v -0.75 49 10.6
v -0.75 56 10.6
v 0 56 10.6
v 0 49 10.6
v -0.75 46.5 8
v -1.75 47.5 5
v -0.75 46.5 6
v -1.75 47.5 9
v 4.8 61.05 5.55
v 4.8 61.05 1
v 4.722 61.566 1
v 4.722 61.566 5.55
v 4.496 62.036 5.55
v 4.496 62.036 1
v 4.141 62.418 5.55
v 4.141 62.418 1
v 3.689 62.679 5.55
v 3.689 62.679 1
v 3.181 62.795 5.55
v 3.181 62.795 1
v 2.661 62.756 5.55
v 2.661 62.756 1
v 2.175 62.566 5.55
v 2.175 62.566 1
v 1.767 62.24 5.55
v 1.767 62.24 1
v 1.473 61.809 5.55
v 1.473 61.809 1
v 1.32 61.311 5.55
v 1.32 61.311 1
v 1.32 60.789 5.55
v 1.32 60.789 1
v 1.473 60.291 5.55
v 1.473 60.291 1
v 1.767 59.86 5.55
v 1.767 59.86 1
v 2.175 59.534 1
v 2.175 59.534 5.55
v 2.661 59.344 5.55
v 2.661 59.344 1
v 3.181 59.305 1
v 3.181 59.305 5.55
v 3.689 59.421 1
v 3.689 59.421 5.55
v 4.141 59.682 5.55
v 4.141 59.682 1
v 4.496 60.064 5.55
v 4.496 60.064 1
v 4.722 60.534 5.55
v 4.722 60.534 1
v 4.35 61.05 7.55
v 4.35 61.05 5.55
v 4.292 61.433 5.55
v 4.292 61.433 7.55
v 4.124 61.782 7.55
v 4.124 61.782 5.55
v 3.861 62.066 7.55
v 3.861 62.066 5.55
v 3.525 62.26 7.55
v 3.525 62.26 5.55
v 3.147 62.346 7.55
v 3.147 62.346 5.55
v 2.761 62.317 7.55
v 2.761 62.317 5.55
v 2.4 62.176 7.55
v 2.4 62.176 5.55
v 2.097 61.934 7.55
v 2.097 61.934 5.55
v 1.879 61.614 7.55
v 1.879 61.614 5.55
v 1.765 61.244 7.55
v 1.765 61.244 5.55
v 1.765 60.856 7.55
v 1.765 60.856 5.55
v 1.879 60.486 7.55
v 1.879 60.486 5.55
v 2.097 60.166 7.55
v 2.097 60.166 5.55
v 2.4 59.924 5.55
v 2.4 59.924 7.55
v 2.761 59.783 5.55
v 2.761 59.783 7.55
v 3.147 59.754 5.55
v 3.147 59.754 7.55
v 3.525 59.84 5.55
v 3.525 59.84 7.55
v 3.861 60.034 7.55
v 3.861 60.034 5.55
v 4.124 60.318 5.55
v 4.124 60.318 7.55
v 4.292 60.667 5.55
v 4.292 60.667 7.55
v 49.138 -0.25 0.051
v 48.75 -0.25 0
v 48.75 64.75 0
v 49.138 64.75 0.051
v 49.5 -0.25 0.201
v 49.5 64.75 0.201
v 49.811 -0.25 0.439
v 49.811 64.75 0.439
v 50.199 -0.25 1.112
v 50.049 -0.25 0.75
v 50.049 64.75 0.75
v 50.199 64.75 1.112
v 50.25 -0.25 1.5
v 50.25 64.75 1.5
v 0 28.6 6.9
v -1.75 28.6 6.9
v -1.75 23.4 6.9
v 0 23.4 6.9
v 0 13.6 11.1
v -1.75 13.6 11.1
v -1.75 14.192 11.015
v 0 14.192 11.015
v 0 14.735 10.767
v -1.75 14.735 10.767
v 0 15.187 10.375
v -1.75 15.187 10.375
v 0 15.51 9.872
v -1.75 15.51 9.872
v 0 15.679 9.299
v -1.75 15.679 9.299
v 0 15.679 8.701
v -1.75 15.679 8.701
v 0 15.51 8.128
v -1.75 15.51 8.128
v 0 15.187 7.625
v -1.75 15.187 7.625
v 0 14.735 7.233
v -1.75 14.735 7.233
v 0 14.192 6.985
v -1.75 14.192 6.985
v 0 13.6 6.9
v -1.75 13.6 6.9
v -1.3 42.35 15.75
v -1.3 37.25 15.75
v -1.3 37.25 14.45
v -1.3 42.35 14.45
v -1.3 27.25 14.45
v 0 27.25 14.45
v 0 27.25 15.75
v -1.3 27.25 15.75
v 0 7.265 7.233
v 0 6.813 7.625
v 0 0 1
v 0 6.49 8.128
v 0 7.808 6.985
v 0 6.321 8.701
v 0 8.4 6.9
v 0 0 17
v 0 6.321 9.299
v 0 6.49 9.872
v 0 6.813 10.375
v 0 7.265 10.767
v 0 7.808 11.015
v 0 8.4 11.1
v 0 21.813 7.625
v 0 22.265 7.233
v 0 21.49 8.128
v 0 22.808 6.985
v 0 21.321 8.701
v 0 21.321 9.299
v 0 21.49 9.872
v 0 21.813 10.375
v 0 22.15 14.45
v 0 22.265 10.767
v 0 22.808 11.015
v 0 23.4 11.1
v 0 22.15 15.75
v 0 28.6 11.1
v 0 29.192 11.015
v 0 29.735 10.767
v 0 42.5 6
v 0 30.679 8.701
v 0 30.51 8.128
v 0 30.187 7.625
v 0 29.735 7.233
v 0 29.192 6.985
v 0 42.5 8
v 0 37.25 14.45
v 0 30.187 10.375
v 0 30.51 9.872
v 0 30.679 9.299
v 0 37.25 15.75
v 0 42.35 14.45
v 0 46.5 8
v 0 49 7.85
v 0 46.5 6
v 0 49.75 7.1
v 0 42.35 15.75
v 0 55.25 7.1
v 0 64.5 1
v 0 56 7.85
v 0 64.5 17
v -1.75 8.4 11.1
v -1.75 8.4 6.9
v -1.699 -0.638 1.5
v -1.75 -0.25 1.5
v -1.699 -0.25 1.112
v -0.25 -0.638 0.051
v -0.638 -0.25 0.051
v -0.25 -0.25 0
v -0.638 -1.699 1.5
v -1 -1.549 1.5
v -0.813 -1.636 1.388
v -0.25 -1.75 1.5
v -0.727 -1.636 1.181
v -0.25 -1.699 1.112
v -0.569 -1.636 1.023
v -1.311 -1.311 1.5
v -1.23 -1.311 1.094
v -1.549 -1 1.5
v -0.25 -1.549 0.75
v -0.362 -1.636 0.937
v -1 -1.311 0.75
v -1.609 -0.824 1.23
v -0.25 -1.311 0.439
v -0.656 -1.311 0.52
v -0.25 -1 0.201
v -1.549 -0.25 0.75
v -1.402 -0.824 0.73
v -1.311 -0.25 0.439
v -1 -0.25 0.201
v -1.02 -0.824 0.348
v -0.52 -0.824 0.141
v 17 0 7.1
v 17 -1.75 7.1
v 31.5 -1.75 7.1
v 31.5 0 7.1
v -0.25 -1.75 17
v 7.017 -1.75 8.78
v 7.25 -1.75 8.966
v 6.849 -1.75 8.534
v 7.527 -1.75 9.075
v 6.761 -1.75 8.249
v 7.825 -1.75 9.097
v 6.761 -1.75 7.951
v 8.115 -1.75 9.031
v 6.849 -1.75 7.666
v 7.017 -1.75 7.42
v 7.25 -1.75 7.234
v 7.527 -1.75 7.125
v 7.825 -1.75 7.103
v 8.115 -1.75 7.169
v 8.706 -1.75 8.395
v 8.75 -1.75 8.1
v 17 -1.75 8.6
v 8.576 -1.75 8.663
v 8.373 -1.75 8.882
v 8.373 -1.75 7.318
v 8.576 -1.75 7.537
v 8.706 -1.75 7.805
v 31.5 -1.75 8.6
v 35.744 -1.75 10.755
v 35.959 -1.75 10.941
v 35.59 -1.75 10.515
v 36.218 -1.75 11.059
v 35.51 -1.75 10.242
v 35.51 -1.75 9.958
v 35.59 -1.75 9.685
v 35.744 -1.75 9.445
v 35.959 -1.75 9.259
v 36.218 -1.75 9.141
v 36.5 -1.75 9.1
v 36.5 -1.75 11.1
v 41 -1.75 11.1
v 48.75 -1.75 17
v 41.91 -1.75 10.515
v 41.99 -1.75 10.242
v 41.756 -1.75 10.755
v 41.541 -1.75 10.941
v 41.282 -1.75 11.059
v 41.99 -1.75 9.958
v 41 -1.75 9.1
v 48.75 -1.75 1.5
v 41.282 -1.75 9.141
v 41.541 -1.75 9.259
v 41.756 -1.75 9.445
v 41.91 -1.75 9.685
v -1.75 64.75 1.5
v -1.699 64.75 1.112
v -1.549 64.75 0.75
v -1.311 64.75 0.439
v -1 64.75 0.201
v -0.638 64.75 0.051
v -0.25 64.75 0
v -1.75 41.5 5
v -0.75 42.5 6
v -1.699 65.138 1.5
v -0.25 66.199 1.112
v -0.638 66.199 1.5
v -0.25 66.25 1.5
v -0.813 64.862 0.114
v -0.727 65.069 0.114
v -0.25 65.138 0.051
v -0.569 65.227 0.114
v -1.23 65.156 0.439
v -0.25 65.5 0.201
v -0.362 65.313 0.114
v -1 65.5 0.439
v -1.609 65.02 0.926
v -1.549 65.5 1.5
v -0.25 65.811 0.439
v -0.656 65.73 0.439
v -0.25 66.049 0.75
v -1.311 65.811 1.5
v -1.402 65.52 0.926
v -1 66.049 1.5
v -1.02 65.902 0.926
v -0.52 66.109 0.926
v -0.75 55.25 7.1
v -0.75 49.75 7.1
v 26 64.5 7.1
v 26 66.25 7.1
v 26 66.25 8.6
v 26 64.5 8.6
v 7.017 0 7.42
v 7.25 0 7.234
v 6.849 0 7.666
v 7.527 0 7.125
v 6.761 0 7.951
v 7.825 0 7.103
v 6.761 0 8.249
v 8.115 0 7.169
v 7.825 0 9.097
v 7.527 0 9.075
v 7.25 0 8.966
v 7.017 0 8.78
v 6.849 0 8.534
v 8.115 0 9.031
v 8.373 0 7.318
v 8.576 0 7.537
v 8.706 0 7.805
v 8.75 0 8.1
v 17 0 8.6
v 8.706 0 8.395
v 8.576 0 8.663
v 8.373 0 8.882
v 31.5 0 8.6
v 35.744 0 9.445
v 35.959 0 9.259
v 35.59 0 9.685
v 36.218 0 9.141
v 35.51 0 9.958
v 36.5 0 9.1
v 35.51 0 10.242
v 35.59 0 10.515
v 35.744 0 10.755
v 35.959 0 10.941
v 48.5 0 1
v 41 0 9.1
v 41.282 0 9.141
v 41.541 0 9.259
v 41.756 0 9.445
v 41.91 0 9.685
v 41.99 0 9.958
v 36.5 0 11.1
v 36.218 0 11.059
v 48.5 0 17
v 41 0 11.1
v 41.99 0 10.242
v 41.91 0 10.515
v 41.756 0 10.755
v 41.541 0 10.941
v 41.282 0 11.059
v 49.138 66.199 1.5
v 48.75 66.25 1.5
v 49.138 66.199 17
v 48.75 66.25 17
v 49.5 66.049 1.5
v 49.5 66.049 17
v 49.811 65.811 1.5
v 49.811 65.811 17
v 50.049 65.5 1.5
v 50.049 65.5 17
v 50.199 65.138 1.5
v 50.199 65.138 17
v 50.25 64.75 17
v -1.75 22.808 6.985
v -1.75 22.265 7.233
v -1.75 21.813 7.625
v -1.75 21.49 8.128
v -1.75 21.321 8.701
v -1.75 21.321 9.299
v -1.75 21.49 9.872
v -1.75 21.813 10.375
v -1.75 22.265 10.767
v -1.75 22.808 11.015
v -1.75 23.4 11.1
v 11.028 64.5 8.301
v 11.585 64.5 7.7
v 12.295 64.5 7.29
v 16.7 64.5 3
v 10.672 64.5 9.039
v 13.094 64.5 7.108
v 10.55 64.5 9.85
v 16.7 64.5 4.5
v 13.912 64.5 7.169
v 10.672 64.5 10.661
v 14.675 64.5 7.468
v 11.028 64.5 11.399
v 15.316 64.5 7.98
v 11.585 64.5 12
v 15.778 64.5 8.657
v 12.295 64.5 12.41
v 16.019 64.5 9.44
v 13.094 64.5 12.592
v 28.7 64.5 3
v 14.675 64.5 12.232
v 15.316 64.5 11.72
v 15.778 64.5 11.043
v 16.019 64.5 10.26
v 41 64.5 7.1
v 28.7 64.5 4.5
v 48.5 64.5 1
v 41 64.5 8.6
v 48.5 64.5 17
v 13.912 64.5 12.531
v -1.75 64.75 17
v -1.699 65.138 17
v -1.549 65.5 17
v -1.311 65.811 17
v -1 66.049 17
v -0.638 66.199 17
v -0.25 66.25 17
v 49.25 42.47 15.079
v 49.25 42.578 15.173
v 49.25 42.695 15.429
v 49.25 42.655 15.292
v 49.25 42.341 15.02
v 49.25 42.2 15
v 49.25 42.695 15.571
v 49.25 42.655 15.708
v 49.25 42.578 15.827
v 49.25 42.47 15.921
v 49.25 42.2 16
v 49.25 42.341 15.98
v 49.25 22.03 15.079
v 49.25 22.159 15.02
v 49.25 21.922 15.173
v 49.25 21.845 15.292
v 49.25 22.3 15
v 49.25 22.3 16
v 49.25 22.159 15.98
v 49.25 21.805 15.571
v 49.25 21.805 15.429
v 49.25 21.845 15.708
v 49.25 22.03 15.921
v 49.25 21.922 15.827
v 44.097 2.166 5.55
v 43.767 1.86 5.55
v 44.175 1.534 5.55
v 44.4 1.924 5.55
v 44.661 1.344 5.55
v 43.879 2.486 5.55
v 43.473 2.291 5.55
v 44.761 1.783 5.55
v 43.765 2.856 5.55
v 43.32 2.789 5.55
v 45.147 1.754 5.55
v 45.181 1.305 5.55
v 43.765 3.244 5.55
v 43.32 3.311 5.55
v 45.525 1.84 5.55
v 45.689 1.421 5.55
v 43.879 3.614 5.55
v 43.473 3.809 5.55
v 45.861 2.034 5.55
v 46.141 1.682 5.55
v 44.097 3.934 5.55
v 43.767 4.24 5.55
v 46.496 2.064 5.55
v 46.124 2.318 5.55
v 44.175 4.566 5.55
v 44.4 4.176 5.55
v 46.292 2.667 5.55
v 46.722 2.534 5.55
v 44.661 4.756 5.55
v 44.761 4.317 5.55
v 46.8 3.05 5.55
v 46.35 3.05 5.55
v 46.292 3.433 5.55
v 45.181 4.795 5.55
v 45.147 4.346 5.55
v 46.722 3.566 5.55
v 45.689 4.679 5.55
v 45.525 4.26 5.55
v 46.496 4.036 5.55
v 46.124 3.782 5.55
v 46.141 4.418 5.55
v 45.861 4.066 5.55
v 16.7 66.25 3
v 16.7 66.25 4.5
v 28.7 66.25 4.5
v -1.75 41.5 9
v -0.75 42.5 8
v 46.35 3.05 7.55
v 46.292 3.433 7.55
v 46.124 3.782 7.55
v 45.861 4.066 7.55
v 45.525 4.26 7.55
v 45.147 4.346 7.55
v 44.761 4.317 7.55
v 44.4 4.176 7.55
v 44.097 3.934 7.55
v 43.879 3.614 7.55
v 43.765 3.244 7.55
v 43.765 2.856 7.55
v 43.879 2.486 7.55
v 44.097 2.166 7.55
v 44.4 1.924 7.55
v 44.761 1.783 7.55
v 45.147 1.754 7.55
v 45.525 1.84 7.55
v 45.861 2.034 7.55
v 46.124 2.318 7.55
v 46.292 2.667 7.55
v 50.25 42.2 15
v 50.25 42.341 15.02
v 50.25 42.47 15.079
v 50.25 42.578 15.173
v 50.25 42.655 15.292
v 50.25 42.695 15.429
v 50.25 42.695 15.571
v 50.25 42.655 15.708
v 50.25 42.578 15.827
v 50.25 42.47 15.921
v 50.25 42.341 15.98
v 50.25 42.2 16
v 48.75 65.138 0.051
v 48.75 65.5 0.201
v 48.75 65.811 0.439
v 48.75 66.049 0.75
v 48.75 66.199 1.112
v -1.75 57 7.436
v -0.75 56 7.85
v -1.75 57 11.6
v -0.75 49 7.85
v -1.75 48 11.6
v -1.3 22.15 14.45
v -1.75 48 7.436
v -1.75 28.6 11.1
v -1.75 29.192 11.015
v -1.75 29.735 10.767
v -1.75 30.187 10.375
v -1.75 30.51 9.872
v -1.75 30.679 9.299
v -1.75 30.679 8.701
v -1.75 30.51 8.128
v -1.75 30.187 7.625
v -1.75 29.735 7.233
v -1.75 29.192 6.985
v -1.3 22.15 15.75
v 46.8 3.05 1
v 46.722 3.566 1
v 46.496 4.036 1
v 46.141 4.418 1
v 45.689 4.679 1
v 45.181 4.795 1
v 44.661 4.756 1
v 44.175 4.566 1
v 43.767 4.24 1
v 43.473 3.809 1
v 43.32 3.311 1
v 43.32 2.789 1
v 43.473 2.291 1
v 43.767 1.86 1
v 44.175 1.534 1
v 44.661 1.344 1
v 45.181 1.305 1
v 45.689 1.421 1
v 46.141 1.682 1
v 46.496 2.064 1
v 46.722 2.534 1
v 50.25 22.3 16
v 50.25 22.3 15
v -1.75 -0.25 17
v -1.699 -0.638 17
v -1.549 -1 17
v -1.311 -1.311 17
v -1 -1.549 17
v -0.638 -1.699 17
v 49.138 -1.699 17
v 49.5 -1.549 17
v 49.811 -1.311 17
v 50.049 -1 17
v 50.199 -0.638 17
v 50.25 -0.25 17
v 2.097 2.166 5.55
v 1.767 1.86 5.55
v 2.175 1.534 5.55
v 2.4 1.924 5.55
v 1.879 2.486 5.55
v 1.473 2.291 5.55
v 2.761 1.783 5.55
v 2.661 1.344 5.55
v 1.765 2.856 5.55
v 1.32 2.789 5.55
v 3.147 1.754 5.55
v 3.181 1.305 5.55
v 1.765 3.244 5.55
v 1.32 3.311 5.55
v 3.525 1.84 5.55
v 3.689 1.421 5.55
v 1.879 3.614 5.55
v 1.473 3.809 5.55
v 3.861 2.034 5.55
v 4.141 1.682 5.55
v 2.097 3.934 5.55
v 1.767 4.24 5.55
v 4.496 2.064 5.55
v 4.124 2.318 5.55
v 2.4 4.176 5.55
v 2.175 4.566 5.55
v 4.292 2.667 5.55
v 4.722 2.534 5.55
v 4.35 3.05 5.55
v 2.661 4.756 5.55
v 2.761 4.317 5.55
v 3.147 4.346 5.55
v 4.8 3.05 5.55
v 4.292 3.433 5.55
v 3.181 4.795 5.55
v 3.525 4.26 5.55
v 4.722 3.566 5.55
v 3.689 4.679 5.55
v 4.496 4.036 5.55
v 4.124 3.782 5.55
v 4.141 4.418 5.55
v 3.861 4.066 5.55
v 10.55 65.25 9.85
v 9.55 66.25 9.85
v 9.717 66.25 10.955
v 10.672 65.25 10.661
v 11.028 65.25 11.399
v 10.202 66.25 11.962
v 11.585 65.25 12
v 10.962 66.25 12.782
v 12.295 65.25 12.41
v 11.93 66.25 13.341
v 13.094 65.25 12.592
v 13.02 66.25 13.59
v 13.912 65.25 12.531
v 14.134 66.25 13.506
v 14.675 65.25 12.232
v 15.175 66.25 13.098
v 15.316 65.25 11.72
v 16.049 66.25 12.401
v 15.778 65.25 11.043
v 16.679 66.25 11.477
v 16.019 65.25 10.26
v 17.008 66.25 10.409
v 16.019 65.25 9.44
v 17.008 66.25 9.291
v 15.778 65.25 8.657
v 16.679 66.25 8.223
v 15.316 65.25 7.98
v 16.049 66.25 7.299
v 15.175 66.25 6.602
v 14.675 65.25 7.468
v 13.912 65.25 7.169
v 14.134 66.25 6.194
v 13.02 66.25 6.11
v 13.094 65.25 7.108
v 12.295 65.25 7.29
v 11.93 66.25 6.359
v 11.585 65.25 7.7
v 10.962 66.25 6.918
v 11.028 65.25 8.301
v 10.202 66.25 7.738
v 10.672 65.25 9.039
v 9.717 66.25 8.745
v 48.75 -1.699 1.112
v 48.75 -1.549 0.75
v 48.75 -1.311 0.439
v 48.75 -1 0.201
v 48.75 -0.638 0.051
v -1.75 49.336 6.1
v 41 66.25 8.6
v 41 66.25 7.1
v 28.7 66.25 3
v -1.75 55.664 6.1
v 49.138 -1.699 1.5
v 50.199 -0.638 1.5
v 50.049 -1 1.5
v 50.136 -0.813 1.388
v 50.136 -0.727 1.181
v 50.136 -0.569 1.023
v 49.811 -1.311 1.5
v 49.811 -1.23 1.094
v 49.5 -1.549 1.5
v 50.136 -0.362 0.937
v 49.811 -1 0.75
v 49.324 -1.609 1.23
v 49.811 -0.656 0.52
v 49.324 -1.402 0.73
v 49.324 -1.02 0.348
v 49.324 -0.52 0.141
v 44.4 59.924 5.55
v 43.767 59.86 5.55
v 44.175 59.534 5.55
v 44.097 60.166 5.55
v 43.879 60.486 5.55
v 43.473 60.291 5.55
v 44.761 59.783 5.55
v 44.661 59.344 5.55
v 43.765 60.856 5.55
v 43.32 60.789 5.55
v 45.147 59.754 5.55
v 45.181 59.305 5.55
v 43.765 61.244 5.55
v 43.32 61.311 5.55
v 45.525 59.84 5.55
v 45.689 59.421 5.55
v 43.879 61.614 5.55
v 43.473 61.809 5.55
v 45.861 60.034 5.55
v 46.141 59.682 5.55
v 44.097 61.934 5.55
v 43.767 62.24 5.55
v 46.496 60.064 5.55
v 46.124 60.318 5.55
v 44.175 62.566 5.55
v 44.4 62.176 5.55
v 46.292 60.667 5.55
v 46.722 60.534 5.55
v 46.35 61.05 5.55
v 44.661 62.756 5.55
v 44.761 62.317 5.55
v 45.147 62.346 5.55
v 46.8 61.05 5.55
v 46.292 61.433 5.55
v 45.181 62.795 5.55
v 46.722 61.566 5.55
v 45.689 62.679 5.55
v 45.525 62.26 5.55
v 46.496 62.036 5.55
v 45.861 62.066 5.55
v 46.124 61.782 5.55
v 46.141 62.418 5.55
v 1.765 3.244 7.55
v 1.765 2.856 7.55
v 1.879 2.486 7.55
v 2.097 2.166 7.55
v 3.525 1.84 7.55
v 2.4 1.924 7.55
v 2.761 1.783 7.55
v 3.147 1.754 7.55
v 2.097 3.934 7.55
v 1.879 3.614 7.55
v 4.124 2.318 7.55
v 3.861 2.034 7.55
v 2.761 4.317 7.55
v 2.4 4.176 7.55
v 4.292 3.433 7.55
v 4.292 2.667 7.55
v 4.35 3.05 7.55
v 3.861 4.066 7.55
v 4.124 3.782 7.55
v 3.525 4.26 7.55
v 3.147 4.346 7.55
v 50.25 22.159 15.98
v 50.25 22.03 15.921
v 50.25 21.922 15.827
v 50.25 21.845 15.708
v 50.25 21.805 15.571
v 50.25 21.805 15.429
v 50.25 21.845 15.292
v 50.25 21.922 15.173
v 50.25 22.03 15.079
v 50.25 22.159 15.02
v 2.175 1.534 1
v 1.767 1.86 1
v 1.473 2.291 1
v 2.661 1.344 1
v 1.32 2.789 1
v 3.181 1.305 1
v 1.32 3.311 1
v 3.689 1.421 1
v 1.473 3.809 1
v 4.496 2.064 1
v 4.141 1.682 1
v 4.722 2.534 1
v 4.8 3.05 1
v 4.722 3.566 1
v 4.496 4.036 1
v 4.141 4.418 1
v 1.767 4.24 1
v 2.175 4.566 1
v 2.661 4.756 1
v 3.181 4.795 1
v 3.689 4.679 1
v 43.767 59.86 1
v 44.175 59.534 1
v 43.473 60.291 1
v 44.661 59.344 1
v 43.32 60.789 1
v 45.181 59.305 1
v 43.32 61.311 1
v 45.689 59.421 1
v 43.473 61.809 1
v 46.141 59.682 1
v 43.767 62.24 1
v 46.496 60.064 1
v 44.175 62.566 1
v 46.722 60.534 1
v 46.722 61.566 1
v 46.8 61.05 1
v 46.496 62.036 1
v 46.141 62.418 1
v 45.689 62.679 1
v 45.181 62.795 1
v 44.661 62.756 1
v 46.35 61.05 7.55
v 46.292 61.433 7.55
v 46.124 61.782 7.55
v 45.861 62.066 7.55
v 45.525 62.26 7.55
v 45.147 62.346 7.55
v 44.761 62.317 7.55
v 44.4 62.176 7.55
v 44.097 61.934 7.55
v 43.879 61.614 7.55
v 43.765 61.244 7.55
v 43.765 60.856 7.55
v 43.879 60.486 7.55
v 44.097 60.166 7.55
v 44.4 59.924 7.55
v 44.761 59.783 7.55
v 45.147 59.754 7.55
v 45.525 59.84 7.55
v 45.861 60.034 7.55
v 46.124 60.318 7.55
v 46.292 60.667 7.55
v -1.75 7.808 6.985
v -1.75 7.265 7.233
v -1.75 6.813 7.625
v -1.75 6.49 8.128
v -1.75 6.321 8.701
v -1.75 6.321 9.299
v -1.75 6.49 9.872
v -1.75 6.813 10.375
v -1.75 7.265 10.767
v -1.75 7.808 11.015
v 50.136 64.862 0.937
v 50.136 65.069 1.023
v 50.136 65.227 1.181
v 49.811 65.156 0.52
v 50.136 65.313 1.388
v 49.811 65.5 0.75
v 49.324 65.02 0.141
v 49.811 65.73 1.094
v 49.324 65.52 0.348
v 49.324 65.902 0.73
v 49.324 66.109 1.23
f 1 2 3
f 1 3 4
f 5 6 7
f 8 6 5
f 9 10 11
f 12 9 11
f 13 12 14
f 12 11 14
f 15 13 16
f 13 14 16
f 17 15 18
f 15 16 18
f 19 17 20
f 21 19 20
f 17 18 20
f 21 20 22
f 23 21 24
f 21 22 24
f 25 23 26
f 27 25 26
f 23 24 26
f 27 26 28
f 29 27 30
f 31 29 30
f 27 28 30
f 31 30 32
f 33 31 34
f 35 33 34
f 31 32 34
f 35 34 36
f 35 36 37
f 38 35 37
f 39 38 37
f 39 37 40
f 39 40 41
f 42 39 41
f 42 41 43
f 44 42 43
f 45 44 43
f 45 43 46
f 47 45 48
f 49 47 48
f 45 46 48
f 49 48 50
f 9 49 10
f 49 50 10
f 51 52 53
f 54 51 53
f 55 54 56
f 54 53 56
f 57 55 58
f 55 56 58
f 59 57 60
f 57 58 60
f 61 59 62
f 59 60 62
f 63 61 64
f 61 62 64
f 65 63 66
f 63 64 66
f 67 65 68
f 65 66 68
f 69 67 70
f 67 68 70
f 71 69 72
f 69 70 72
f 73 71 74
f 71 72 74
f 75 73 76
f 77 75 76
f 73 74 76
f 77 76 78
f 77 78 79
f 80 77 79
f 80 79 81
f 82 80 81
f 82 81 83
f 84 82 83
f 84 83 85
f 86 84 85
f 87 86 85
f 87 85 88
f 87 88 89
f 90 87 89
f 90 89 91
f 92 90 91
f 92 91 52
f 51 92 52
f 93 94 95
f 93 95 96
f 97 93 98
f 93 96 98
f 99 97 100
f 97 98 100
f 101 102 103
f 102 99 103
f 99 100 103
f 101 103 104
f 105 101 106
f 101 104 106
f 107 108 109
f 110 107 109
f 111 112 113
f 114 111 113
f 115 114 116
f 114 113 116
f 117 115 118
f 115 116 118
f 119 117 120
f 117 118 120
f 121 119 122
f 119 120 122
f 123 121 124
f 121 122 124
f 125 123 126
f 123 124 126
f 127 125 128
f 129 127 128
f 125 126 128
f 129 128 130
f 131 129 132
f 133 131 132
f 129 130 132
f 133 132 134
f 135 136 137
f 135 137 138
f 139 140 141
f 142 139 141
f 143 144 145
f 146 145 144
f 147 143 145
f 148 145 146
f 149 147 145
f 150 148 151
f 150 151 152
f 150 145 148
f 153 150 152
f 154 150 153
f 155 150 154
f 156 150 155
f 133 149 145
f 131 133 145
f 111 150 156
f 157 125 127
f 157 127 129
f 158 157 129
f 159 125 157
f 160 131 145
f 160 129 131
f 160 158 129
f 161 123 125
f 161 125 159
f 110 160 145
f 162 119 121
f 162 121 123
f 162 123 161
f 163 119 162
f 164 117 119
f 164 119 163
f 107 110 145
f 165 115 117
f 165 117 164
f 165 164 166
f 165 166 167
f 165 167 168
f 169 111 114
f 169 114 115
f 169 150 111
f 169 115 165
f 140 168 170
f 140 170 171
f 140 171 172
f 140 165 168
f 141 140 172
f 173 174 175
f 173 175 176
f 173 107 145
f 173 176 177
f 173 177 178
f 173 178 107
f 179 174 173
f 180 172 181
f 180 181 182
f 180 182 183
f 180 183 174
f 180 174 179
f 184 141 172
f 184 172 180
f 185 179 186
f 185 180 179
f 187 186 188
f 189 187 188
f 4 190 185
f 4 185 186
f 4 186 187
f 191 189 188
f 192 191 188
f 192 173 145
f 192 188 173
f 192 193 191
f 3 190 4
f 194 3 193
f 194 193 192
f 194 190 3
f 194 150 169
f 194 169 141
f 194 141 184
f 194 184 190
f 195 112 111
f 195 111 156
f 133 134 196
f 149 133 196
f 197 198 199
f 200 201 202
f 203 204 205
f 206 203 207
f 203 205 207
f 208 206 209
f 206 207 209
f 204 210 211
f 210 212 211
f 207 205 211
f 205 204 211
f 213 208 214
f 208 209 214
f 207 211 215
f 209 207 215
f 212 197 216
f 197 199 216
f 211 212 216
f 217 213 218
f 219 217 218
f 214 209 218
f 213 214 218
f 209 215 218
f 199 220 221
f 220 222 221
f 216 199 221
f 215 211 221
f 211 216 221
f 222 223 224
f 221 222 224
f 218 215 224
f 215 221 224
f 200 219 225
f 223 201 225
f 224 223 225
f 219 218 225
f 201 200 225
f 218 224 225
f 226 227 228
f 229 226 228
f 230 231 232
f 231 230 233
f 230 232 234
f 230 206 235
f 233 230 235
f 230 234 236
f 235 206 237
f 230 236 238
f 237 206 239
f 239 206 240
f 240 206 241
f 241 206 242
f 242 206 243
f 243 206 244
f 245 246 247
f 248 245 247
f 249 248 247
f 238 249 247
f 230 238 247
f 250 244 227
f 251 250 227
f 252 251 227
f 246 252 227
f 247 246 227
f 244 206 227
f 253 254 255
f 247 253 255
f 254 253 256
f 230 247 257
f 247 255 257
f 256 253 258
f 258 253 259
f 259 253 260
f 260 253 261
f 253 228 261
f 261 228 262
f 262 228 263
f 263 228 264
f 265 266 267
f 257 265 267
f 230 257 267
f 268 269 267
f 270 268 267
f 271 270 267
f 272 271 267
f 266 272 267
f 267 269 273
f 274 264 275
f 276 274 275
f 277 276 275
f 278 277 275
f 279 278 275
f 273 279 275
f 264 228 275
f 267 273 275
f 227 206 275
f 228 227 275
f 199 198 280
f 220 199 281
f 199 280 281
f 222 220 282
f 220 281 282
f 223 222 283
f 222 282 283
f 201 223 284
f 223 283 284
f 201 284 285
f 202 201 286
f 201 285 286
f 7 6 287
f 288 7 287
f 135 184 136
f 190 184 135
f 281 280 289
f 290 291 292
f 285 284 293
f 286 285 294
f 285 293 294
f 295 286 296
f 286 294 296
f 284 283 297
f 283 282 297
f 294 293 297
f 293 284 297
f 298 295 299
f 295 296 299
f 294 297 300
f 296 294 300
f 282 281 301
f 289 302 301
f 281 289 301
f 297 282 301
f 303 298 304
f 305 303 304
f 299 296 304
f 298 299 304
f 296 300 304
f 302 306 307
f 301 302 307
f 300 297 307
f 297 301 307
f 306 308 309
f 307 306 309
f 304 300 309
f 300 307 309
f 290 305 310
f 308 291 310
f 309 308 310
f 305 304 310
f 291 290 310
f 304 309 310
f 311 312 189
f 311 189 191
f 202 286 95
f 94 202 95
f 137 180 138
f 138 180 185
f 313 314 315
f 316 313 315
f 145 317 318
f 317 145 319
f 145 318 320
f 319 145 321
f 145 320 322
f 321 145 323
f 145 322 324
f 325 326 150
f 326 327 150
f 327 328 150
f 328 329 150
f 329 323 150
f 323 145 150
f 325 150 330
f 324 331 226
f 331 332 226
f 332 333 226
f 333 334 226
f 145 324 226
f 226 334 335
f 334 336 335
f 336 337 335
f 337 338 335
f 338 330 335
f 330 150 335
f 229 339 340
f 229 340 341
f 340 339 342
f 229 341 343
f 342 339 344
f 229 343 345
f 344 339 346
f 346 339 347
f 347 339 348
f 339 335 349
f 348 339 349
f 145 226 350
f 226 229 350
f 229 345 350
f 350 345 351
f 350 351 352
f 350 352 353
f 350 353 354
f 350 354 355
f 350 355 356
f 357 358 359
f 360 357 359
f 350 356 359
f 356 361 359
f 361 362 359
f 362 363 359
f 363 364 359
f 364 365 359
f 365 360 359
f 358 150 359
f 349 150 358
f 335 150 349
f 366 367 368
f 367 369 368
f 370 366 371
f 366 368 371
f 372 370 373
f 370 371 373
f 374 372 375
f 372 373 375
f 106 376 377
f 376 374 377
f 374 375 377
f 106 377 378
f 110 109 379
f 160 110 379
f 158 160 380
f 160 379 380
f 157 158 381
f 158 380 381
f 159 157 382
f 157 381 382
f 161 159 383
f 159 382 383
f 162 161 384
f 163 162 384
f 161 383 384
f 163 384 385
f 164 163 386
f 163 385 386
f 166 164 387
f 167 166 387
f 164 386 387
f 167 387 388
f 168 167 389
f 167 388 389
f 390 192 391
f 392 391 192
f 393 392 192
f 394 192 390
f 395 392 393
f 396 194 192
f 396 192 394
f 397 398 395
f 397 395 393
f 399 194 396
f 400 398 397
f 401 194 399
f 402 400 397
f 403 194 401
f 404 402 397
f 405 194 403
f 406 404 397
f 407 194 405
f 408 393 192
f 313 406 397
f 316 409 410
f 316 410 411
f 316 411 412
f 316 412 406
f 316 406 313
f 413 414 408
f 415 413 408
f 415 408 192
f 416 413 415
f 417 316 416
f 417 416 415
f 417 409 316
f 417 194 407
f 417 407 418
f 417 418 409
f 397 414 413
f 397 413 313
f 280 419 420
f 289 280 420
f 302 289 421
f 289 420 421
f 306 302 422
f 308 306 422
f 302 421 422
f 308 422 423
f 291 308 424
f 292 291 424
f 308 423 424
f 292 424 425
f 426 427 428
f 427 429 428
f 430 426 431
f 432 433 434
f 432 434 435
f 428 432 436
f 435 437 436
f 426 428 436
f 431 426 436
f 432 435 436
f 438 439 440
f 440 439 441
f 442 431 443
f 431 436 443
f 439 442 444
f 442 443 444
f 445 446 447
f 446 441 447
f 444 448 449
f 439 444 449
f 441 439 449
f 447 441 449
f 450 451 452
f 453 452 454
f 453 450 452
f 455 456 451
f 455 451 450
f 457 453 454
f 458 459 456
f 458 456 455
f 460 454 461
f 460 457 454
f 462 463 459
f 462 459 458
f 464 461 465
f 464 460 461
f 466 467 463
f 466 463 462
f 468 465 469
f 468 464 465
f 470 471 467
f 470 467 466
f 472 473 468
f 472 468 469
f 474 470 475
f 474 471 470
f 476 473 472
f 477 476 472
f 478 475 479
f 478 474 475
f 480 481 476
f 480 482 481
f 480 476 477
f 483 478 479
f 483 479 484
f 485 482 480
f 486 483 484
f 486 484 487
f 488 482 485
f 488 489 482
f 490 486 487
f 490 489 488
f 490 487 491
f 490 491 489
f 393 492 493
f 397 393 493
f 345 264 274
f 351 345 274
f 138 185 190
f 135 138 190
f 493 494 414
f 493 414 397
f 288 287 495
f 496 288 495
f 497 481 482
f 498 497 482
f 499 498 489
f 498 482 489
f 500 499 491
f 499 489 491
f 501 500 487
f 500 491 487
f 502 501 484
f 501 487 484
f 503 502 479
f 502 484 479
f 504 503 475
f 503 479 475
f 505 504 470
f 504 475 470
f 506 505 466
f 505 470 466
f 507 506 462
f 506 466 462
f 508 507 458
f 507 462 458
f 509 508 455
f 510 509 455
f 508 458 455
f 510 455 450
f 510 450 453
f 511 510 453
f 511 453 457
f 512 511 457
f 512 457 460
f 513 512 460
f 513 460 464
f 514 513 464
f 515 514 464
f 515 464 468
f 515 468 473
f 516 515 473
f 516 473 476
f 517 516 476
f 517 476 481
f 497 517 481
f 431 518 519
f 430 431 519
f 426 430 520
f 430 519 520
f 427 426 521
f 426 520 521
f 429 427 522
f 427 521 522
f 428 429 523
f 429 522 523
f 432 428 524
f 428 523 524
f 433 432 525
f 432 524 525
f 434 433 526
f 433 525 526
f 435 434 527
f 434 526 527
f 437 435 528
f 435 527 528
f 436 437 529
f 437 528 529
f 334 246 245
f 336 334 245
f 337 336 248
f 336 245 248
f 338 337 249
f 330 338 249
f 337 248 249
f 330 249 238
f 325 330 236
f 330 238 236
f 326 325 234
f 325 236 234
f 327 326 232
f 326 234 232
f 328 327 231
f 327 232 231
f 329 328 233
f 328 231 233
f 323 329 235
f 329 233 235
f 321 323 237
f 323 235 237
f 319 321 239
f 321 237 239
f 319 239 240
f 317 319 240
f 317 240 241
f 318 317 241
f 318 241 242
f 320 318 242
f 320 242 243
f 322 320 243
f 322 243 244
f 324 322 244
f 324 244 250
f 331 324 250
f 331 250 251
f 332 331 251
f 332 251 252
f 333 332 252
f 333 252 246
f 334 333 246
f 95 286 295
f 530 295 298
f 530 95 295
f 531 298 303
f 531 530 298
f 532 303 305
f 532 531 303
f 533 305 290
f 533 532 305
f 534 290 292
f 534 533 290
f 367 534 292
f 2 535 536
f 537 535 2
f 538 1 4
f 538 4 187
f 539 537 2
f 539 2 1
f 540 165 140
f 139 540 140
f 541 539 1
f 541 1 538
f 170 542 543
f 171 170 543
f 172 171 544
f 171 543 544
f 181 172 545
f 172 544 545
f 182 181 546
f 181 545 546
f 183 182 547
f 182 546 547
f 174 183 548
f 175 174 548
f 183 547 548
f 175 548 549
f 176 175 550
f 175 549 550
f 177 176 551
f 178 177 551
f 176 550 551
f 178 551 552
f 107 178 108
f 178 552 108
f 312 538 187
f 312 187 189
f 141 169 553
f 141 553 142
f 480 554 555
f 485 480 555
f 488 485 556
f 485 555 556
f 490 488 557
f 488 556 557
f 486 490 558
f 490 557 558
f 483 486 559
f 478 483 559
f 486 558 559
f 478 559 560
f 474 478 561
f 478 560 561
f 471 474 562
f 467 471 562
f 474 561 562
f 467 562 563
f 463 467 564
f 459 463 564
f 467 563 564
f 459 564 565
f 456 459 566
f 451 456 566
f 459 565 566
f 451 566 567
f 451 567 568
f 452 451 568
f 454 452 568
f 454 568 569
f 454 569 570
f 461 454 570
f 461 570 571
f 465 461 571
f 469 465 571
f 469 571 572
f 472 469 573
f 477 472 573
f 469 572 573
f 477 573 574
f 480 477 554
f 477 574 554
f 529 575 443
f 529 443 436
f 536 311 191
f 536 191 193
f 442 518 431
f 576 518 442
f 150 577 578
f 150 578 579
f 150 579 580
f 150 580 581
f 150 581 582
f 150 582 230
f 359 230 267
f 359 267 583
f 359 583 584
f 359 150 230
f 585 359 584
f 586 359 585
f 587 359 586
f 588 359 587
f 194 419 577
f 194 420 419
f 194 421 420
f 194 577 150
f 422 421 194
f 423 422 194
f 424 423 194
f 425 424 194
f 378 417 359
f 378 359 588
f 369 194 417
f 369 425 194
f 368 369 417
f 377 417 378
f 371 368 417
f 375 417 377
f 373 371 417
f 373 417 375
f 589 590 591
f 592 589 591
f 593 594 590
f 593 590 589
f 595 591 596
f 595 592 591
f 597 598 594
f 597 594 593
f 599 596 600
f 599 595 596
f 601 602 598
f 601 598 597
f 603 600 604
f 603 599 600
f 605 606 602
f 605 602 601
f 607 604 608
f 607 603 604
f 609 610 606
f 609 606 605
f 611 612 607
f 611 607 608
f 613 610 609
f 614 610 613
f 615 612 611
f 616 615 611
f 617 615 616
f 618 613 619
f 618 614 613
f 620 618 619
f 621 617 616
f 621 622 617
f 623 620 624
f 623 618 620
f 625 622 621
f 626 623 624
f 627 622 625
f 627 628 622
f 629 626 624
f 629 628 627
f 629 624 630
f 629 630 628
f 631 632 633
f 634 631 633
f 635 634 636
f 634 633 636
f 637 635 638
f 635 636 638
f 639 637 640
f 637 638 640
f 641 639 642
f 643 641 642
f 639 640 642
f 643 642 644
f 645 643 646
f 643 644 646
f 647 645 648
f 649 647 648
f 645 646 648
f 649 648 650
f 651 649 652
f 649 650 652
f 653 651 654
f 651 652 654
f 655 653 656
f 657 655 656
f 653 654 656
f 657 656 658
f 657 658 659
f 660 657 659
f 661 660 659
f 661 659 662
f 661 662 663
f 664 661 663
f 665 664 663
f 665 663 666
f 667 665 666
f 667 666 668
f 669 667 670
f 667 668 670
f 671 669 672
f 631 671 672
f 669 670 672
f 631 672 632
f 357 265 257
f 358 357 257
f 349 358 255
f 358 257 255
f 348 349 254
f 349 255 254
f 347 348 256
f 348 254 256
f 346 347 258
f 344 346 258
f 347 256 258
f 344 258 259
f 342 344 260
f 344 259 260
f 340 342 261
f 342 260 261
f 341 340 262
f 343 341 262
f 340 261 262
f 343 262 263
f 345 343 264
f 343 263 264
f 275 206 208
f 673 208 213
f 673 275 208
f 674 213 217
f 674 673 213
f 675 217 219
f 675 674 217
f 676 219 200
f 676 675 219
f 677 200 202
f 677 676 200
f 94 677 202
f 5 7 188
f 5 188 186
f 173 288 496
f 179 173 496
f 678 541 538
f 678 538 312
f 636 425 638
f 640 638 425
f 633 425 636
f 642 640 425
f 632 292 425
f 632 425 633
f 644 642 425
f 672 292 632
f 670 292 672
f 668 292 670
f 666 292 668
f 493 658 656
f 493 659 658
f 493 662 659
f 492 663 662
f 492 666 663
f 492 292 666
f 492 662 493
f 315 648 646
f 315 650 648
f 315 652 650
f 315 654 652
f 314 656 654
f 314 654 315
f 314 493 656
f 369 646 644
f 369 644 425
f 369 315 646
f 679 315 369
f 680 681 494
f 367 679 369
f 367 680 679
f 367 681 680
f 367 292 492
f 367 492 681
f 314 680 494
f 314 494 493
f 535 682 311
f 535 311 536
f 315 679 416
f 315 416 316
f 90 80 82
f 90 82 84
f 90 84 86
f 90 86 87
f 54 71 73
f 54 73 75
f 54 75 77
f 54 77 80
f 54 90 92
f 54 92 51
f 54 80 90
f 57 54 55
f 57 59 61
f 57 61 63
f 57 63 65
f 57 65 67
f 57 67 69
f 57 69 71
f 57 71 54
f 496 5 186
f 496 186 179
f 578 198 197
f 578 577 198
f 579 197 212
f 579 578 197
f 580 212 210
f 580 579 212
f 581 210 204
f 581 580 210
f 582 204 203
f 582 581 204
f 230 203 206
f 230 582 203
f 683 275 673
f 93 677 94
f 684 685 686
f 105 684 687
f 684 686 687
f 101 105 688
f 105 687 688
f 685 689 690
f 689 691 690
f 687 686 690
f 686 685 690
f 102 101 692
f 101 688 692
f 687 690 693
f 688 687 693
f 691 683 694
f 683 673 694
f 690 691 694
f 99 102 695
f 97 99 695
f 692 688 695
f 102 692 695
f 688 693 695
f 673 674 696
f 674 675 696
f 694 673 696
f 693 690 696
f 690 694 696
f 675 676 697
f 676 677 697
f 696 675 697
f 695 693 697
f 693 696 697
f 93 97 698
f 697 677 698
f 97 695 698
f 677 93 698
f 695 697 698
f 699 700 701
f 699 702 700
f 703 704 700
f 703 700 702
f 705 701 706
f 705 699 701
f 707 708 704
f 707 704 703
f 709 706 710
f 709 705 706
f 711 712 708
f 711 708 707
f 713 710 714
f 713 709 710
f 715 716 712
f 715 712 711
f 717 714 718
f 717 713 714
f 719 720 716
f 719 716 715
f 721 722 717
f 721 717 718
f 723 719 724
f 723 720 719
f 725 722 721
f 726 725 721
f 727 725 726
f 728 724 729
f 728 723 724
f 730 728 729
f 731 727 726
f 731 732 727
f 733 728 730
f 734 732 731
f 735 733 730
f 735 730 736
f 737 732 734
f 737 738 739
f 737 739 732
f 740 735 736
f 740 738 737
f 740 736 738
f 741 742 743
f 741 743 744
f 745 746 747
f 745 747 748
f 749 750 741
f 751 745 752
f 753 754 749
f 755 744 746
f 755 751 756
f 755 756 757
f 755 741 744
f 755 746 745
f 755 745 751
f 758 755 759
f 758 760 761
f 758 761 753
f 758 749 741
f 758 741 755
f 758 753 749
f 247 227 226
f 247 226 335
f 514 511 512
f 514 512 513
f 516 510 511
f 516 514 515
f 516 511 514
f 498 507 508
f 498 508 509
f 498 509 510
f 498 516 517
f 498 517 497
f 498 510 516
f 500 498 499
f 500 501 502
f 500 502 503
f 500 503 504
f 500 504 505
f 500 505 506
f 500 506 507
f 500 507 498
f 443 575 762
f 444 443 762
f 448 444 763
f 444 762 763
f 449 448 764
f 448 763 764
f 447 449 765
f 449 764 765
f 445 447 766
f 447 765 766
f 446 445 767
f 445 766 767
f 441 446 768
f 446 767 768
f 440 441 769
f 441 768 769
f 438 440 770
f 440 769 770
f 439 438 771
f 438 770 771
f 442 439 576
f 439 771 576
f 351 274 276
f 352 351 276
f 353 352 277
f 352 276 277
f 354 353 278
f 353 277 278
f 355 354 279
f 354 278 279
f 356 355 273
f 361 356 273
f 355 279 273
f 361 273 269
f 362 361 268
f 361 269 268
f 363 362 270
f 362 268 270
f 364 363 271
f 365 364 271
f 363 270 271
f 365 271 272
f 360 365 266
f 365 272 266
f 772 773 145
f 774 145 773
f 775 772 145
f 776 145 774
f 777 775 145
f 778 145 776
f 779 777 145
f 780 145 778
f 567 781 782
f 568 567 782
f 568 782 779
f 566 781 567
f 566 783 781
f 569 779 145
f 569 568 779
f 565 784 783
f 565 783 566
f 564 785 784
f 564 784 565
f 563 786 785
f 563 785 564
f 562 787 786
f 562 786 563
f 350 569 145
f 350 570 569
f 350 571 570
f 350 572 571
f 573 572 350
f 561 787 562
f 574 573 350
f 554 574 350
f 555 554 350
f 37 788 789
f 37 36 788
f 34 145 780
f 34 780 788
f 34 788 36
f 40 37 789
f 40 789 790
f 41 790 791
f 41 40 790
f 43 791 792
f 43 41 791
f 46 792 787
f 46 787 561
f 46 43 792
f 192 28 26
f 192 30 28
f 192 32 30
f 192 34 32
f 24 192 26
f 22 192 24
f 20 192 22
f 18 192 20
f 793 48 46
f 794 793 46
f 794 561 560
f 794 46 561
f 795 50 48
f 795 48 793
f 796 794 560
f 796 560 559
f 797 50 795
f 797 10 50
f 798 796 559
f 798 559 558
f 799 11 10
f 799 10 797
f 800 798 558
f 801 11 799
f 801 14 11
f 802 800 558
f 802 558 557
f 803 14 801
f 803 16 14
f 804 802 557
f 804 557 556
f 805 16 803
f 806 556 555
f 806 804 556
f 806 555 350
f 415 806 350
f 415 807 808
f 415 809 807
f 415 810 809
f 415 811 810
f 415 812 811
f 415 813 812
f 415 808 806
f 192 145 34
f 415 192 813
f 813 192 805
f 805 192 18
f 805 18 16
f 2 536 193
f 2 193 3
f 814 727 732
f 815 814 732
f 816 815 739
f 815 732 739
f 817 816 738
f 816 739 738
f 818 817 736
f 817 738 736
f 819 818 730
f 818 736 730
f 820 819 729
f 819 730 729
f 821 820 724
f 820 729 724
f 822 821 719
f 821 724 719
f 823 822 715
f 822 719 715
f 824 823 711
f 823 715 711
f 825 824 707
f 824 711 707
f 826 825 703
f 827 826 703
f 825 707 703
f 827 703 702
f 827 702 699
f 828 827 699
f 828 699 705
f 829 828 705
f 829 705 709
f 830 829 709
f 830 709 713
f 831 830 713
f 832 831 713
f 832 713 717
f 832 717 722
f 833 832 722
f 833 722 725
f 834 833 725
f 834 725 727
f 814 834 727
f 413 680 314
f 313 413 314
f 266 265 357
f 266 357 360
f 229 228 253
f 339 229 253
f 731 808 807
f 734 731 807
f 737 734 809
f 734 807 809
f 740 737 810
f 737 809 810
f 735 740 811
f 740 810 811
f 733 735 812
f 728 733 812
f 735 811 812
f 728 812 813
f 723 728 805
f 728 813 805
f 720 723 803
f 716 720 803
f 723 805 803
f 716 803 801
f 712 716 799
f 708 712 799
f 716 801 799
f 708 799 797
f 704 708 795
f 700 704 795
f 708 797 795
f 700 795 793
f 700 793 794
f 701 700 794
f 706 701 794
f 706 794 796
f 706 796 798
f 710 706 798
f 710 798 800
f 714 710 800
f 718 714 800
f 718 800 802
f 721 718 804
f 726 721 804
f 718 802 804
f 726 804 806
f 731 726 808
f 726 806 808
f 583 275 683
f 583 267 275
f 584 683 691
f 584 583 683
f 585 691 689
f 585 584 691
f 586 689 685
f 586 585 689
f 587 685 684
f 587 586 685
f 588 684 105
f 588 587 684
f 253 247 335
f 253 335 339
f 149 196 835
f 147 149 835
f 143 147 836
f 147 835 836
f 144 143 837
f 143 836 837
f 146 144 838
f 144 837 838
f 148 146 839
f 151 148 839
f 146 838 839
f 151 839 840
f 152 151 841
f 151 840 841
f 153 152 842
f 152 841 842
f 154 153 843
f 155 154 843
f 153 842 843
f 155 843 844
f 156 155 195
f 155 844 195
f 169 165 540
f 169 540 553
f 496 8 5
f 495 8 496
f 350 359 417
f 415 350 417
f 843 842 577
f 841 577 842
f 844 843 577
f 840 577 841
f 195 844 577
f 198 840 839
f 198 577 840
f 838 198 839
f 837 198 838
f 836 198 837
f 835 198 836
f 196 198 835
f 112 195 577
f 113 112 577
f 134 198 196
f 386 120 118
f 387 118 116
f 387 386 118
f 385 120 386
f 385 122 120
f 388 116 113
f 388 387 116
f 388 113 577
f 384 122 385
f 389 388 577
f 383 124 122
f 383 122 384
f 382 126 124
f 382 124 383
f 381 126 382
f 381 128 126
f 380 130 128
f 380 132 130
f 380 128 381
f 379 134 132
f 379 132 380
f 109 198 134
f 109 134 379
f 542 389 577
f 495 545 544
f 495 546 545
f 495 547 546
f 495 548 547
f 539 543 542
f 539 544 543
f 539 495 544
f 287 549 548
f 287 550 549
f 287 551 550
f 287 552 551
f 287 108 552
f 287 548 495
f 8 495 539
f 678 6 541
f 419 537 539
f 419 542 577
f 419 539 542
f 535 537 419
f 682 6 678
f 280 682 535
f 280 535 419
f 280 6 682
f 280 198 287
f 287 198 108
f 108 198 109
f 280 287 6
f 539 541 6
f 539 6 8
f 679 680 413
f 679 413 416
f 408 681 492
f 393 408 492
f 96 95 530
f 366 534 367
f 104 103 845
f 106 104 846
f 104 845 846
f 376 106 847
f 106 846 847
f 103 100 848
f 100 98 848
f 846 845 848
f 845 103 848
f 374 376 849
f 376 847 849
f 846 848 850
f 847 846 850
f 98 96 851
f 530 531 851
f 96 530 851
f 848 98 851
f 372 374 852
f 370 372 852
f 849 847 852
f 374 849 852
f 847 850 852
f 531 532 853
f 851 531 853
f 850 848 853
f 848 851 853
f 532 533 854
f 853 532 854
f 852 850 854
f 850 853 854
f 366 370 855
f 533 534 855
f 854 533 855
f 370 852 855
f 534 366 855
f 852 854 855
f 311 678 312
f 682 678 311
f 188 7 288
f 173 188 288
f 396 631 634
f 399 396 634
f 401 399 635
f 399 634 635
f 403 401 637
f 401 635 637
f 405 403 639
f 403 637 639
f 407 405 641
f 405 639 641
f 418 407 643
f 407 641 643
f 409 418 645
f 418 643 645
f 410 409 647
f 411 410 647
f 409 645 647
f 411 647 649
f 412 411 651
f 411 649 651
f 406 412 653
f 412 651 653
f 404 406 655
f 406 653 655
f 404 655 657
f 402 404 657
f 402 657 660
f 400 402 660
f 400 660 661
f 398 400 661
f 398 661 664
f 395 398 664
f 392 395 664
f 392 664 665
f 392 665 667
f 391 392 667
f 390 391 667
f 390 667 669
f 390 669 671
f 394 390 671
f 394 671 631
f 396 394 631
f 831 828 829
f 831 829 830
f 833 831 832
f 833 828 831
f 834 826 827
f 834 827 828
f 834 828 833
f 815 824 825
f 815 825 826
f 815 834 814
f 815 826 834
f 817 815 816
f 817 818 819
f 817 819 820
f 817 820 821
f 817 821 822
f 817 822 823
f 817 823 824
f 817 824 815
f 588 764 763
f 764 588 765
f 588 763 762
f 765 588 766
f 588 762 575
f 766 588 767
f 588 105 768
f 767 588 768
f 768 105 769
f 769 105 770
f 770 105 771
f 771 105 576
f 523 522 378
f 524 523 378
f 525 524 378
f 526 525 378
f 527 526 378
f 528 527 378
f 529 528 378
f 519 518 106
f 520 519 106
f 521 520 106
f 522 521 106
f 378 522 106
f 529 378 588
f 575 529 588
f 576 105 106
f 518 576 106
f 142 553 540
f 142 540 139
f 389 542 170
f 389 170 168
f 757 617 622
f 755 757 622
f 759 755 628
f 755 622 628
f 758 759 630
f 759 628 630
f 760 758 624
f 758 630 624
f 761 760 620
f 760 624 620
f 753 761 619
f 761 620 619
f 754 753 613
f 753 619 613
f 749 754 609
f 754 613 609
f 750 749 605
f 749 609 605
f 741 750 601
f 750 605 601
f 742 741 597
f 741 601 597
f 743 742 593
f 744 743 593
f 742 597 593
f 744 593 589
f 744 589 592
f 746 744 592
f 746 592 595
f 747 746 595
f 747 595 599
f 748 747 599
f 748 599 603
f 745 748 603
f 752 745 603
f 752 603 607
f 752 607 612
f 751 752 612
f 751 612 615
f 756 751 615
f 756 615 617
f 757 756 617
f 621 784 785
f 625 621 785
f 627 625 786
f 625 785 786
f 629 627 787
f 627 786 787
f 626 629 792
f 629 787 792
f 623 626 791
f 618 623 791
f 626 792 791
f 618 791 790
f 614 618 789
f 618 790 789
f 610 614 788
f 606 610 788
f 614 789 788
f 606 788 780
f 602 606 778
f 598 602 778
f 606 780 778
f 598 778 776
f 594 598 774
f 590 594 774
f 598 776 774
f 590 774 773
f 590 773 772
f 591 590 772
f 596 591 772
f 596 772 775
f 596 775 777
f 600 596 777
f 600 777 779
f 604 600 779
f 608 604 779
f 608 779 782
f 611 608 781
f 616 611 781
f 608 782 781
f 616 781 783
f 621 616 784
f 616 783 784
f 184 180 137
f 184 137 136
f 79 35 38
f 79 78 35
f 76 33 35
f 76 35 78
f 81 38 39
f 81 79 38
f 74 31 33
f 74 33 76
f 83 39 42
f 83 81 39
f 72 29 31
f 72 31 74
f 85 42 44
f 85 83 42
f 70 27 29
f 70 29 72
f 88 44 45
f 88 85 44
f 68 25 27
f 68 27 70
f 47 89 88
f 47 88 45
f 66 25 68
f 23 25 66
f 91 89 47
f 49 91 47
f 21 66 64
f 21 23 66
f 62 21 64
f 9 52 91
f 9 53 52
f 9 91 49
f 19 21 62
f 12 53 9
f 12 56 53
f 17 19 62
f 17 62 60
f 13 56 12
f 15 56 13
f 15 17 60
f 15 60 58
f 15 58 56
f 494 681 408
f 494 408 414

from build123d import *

# Parameters (mm, degrees)
SKETCH_W        = 52
SKETCH_H        = 68
PAD_DEPTH       = 17
SKETCH001_W     = 48.5
SKETCH001_H     = 64.5
POCKET_DEPTH    = 16
SKETCH002_R     = 1.75
PAD001_DEPTH    = 4.55
SKETCH003_R     = 1.3
PAD002_DEPTH    = 6.55
SKETCH004_W     = 4
SKETCH004_H     = 2
POCKET001_DEPTH = 5
POCKET002_DEPTH = 5
SKETCH006_R     = 2.75
SKETCH006_W     = 12
SKETCH006_H     = 1.5
SKETCH006_W_2   = 15
POCKET003_DEPTH = 5
SKETCH007_R     = 1
SKETCH007_W     = 14.5
SKETCH007_H     = 1.5
POCKET004_DEPTH = 5
POCKET006_DEPTH = 1
SKETCH008_W     = 5.1
SKETCH008_H     = 1.3
POCKET007_DEPTH = 1.3
CHAMFER_SIZE    = 1
FILLET_R        = 1.5


with BuildPart() as part:
    # Sketch → Pad (new body)
    with BuildSketch(Plane.XY):
        with Locations((24.25, 32.25)):
            Rectangle(SKETCH_W, SKETCH_H)
    extrude(amount=PAD_DEPTH)

    # Sketch001 → Pocket (cut)
    with BuildSketch(Plane.XY.offset(17)):
        with Locations((24.25, 32.25)):
            Rectangle(SKETCH001_W, SKETCH001_H)
    extrude(amount=-POCKET_DEPTH, mode=Mode.SUBTRACT)

    # Sketch002 (on Face11 of Pocket) → Pad001 (join)
    with BuildSketch(Plane.XY.offset(1)):
        with Locations((3.05, 3.05)):
            Circle(SKETCH002_R)
        with Locations((3.05, 61.05)):
            Circle(SKETCH002_R)
        with Locations((45.05, 3.05)):
            Circle(SKETCH002_R)
        with Locations((45.05, 61.05)):
            Circle(SKETCH002_R)
    extrude(amount=PAD001_DEPTH)

    # Sketch003 (on Face11 of Pad001) → Pad002 (join)
    with BuildSketch(Plane.XY.offset(1)):
        with Locations((3.05, 61.05)):
            Circle(SKETCH003_R)
        with Locations((45.05, 61.05)):
            Circle(SKETCH003_R)
        with Locations((3.05, 3.05)):
            Circle(SKETCH003_R)
        with Locations((45.05, 3.05)):
            Circle(SKETCH003_R)
    extrude(amount=PAD002_DEPTH)

    # Sketch004 (on Face2 of Pad002) → Pocket001 (cut)
    with BuildSketch(Plane(origin=(-1.75, 0, 0), x_dir=(0, -1, 0), z_dir=(-1, 0, 0))):
        with BuildLine():
            ThreePointArc((-28.6, 11.1), (-30.7, 9), (-28.6, 6.9))
            Line((-28.6, 6.9), (-23.4, 6.9))
            ThreePointArc((-23.4, 6.9), (-21.3, 9), (-23.4, 11.1))
            Line((-28.6, 11.1), (-23.4, 11.1))
        make_face()
        with BuildLine():
            ThreePointArc((-13.6, 11.1), (-15.7, 9), (-13.6, 6.9))
            Line((-13.6, 6.9), (-8.4, 6.9))
            ThreePointArc((-8.4, 6.9), (-6.3, 9), (-8.4, 11.1))
            Line((-13.6, 11.1), (-8.4, 11.1))
        make_face()
        with Locations((-44.5, 7)):
            Rectangle(SKETCH004_W, SKETCH004_H)
    extrude(amount=-POCKET001_DEPTH, mode=Mode.SUBTRACT)

    # Sketch005 (on Face2 of Pocket001) → Pocket002 (cut)
    with BuildSketch(Plane(origin=(-1.75, 0, 0), x_dir=(0, -1, 0), z_dir=(-1, 0, 0))):
        Polygon((-56, 10.6), (-49, 10.6), (-49, 7.85), (-49.75, 7.1), (-55.25, 7.1), (-56, 7.85), align=None)
    extrude(amount=-POCKET002_DEPTH, mode=Mode.SUBTRACT)

    # Sketch006 (on Face1 of Pocket002) → Pocket003 (cut)
    with BuildSketch(Plane(origin=(0, 66.25, 0), x_dir=(-1, 0, 0), z_dir=(0, 1, 0))):
        with Locations((-13.3, 9.85)):
            Circle(SKETCH006_R)
        with Locations((-22.7, 3.75)):
            Rectangle(SKETCH006_W, SKETCH006_H)
        with Locations((-33.5, 7.85)):
            Rectangle(SKETCH006_W_2, SKETCH006_H)
    extrude(amount=-POCKET003_DEPTH, mode=Mode.SUBTRACT)

    # Sketch007 (on Face15 of Pocket007) → Pocket004 (cut)
    with BuildSketch(Plane.XZ.offset(1.75)):
        with Locations((7.75, 8.1)):
            Circle(SKETCH007_R)
        with Locations((24.25, 7.85)):
            Rectangle(SKETCH007_W, SKETCH007_H)
        with BuildLine():
            ThreePointArc((36.5, 11.1), (35.5, 10.1), (36.5, 9.1))
            Line((36.5, 9.1), (41, 9.1))
            ThreePointArc((41, 9.1), (42, 10.1), (41, 11.1))
            Line((36.5, 11.1), (41, 11.1))
        make_face()
    extrude(amount=-POCKET004_DEPTH, mode=Mode.SUBTRACT)

    # Sketch009 → Pocket006 (cut)
    with BuildSketch(Plane.YZ.offset(50.25)):
        with BuildLine():
            Line((22.3, 16), (42.2, 16))
            ThreePointArc((42.2, 15), (42.7, 15.5), (42.2, 16))
            Line((42.2, 15), (22.3, 15))
            ThreePointArc((22.3, 16), (21.8, 15.5), (22.3, 15))
        make_face()
    extrude(amount=-POCKET006_DEPTH, mode=Mode.SUBTRACT)

    # Sketch008 (on Face34 of Pocket006) → Pocket007 (cut)
    with BuildSketch(Plane.YZ):
        with Locations((24.7, 15.1)):
            Rectangle(SKETCH008_W, SKETCH008_H)
        with Locations((39.8, 15.1)):
            Rectangle(SKETCH008_W, SKETCH008_H)
    extrude(amount=-POCKET007_DEPTH, mode=Mode.SUBTRACT)

    # Chamfer
    chamfer_edges = [part.edges().sort_by_distance(p)[0] for p in [
        (-1.75, 49.375, 7.475),
        (-1.75, 49, 9.225),
        (-1.75, 52.5, 10.6),
        (-1.75, 56, 9.225),
        (-1.75, 55.625, 7.475),
        (-1.75, 52.5, 7.1),
        (-1.75, 46.5, 7),
        (-1.75, 44.5, 8),
        (-1.75, 42.5, 7),
        (-1.75, 44.5, 6),
        (16.05, 66.25, 9.85),
    ]]
    chamfer(chamfer_edges, length=CHAMFER_SIZE)

    # Fillet
    fillet_edges = [part.edges().sort_by_distance(p)[0] for p in [
        (-1.75, 66.25, 8.5),
        (-1.75, 32.25, 0),
        (24.25, 66.25, 0),
        (-1.75, -1.75, 8.5),
        (24.25, -1.75, 0),
        (50.25, -1.75, 8.5),
        (50.25, 32.25, 0),
        (50.25, 66.25, 8.5),
    ]]
    fillet(fillet_edges, radius=FILLET_R)


solid = part.part
